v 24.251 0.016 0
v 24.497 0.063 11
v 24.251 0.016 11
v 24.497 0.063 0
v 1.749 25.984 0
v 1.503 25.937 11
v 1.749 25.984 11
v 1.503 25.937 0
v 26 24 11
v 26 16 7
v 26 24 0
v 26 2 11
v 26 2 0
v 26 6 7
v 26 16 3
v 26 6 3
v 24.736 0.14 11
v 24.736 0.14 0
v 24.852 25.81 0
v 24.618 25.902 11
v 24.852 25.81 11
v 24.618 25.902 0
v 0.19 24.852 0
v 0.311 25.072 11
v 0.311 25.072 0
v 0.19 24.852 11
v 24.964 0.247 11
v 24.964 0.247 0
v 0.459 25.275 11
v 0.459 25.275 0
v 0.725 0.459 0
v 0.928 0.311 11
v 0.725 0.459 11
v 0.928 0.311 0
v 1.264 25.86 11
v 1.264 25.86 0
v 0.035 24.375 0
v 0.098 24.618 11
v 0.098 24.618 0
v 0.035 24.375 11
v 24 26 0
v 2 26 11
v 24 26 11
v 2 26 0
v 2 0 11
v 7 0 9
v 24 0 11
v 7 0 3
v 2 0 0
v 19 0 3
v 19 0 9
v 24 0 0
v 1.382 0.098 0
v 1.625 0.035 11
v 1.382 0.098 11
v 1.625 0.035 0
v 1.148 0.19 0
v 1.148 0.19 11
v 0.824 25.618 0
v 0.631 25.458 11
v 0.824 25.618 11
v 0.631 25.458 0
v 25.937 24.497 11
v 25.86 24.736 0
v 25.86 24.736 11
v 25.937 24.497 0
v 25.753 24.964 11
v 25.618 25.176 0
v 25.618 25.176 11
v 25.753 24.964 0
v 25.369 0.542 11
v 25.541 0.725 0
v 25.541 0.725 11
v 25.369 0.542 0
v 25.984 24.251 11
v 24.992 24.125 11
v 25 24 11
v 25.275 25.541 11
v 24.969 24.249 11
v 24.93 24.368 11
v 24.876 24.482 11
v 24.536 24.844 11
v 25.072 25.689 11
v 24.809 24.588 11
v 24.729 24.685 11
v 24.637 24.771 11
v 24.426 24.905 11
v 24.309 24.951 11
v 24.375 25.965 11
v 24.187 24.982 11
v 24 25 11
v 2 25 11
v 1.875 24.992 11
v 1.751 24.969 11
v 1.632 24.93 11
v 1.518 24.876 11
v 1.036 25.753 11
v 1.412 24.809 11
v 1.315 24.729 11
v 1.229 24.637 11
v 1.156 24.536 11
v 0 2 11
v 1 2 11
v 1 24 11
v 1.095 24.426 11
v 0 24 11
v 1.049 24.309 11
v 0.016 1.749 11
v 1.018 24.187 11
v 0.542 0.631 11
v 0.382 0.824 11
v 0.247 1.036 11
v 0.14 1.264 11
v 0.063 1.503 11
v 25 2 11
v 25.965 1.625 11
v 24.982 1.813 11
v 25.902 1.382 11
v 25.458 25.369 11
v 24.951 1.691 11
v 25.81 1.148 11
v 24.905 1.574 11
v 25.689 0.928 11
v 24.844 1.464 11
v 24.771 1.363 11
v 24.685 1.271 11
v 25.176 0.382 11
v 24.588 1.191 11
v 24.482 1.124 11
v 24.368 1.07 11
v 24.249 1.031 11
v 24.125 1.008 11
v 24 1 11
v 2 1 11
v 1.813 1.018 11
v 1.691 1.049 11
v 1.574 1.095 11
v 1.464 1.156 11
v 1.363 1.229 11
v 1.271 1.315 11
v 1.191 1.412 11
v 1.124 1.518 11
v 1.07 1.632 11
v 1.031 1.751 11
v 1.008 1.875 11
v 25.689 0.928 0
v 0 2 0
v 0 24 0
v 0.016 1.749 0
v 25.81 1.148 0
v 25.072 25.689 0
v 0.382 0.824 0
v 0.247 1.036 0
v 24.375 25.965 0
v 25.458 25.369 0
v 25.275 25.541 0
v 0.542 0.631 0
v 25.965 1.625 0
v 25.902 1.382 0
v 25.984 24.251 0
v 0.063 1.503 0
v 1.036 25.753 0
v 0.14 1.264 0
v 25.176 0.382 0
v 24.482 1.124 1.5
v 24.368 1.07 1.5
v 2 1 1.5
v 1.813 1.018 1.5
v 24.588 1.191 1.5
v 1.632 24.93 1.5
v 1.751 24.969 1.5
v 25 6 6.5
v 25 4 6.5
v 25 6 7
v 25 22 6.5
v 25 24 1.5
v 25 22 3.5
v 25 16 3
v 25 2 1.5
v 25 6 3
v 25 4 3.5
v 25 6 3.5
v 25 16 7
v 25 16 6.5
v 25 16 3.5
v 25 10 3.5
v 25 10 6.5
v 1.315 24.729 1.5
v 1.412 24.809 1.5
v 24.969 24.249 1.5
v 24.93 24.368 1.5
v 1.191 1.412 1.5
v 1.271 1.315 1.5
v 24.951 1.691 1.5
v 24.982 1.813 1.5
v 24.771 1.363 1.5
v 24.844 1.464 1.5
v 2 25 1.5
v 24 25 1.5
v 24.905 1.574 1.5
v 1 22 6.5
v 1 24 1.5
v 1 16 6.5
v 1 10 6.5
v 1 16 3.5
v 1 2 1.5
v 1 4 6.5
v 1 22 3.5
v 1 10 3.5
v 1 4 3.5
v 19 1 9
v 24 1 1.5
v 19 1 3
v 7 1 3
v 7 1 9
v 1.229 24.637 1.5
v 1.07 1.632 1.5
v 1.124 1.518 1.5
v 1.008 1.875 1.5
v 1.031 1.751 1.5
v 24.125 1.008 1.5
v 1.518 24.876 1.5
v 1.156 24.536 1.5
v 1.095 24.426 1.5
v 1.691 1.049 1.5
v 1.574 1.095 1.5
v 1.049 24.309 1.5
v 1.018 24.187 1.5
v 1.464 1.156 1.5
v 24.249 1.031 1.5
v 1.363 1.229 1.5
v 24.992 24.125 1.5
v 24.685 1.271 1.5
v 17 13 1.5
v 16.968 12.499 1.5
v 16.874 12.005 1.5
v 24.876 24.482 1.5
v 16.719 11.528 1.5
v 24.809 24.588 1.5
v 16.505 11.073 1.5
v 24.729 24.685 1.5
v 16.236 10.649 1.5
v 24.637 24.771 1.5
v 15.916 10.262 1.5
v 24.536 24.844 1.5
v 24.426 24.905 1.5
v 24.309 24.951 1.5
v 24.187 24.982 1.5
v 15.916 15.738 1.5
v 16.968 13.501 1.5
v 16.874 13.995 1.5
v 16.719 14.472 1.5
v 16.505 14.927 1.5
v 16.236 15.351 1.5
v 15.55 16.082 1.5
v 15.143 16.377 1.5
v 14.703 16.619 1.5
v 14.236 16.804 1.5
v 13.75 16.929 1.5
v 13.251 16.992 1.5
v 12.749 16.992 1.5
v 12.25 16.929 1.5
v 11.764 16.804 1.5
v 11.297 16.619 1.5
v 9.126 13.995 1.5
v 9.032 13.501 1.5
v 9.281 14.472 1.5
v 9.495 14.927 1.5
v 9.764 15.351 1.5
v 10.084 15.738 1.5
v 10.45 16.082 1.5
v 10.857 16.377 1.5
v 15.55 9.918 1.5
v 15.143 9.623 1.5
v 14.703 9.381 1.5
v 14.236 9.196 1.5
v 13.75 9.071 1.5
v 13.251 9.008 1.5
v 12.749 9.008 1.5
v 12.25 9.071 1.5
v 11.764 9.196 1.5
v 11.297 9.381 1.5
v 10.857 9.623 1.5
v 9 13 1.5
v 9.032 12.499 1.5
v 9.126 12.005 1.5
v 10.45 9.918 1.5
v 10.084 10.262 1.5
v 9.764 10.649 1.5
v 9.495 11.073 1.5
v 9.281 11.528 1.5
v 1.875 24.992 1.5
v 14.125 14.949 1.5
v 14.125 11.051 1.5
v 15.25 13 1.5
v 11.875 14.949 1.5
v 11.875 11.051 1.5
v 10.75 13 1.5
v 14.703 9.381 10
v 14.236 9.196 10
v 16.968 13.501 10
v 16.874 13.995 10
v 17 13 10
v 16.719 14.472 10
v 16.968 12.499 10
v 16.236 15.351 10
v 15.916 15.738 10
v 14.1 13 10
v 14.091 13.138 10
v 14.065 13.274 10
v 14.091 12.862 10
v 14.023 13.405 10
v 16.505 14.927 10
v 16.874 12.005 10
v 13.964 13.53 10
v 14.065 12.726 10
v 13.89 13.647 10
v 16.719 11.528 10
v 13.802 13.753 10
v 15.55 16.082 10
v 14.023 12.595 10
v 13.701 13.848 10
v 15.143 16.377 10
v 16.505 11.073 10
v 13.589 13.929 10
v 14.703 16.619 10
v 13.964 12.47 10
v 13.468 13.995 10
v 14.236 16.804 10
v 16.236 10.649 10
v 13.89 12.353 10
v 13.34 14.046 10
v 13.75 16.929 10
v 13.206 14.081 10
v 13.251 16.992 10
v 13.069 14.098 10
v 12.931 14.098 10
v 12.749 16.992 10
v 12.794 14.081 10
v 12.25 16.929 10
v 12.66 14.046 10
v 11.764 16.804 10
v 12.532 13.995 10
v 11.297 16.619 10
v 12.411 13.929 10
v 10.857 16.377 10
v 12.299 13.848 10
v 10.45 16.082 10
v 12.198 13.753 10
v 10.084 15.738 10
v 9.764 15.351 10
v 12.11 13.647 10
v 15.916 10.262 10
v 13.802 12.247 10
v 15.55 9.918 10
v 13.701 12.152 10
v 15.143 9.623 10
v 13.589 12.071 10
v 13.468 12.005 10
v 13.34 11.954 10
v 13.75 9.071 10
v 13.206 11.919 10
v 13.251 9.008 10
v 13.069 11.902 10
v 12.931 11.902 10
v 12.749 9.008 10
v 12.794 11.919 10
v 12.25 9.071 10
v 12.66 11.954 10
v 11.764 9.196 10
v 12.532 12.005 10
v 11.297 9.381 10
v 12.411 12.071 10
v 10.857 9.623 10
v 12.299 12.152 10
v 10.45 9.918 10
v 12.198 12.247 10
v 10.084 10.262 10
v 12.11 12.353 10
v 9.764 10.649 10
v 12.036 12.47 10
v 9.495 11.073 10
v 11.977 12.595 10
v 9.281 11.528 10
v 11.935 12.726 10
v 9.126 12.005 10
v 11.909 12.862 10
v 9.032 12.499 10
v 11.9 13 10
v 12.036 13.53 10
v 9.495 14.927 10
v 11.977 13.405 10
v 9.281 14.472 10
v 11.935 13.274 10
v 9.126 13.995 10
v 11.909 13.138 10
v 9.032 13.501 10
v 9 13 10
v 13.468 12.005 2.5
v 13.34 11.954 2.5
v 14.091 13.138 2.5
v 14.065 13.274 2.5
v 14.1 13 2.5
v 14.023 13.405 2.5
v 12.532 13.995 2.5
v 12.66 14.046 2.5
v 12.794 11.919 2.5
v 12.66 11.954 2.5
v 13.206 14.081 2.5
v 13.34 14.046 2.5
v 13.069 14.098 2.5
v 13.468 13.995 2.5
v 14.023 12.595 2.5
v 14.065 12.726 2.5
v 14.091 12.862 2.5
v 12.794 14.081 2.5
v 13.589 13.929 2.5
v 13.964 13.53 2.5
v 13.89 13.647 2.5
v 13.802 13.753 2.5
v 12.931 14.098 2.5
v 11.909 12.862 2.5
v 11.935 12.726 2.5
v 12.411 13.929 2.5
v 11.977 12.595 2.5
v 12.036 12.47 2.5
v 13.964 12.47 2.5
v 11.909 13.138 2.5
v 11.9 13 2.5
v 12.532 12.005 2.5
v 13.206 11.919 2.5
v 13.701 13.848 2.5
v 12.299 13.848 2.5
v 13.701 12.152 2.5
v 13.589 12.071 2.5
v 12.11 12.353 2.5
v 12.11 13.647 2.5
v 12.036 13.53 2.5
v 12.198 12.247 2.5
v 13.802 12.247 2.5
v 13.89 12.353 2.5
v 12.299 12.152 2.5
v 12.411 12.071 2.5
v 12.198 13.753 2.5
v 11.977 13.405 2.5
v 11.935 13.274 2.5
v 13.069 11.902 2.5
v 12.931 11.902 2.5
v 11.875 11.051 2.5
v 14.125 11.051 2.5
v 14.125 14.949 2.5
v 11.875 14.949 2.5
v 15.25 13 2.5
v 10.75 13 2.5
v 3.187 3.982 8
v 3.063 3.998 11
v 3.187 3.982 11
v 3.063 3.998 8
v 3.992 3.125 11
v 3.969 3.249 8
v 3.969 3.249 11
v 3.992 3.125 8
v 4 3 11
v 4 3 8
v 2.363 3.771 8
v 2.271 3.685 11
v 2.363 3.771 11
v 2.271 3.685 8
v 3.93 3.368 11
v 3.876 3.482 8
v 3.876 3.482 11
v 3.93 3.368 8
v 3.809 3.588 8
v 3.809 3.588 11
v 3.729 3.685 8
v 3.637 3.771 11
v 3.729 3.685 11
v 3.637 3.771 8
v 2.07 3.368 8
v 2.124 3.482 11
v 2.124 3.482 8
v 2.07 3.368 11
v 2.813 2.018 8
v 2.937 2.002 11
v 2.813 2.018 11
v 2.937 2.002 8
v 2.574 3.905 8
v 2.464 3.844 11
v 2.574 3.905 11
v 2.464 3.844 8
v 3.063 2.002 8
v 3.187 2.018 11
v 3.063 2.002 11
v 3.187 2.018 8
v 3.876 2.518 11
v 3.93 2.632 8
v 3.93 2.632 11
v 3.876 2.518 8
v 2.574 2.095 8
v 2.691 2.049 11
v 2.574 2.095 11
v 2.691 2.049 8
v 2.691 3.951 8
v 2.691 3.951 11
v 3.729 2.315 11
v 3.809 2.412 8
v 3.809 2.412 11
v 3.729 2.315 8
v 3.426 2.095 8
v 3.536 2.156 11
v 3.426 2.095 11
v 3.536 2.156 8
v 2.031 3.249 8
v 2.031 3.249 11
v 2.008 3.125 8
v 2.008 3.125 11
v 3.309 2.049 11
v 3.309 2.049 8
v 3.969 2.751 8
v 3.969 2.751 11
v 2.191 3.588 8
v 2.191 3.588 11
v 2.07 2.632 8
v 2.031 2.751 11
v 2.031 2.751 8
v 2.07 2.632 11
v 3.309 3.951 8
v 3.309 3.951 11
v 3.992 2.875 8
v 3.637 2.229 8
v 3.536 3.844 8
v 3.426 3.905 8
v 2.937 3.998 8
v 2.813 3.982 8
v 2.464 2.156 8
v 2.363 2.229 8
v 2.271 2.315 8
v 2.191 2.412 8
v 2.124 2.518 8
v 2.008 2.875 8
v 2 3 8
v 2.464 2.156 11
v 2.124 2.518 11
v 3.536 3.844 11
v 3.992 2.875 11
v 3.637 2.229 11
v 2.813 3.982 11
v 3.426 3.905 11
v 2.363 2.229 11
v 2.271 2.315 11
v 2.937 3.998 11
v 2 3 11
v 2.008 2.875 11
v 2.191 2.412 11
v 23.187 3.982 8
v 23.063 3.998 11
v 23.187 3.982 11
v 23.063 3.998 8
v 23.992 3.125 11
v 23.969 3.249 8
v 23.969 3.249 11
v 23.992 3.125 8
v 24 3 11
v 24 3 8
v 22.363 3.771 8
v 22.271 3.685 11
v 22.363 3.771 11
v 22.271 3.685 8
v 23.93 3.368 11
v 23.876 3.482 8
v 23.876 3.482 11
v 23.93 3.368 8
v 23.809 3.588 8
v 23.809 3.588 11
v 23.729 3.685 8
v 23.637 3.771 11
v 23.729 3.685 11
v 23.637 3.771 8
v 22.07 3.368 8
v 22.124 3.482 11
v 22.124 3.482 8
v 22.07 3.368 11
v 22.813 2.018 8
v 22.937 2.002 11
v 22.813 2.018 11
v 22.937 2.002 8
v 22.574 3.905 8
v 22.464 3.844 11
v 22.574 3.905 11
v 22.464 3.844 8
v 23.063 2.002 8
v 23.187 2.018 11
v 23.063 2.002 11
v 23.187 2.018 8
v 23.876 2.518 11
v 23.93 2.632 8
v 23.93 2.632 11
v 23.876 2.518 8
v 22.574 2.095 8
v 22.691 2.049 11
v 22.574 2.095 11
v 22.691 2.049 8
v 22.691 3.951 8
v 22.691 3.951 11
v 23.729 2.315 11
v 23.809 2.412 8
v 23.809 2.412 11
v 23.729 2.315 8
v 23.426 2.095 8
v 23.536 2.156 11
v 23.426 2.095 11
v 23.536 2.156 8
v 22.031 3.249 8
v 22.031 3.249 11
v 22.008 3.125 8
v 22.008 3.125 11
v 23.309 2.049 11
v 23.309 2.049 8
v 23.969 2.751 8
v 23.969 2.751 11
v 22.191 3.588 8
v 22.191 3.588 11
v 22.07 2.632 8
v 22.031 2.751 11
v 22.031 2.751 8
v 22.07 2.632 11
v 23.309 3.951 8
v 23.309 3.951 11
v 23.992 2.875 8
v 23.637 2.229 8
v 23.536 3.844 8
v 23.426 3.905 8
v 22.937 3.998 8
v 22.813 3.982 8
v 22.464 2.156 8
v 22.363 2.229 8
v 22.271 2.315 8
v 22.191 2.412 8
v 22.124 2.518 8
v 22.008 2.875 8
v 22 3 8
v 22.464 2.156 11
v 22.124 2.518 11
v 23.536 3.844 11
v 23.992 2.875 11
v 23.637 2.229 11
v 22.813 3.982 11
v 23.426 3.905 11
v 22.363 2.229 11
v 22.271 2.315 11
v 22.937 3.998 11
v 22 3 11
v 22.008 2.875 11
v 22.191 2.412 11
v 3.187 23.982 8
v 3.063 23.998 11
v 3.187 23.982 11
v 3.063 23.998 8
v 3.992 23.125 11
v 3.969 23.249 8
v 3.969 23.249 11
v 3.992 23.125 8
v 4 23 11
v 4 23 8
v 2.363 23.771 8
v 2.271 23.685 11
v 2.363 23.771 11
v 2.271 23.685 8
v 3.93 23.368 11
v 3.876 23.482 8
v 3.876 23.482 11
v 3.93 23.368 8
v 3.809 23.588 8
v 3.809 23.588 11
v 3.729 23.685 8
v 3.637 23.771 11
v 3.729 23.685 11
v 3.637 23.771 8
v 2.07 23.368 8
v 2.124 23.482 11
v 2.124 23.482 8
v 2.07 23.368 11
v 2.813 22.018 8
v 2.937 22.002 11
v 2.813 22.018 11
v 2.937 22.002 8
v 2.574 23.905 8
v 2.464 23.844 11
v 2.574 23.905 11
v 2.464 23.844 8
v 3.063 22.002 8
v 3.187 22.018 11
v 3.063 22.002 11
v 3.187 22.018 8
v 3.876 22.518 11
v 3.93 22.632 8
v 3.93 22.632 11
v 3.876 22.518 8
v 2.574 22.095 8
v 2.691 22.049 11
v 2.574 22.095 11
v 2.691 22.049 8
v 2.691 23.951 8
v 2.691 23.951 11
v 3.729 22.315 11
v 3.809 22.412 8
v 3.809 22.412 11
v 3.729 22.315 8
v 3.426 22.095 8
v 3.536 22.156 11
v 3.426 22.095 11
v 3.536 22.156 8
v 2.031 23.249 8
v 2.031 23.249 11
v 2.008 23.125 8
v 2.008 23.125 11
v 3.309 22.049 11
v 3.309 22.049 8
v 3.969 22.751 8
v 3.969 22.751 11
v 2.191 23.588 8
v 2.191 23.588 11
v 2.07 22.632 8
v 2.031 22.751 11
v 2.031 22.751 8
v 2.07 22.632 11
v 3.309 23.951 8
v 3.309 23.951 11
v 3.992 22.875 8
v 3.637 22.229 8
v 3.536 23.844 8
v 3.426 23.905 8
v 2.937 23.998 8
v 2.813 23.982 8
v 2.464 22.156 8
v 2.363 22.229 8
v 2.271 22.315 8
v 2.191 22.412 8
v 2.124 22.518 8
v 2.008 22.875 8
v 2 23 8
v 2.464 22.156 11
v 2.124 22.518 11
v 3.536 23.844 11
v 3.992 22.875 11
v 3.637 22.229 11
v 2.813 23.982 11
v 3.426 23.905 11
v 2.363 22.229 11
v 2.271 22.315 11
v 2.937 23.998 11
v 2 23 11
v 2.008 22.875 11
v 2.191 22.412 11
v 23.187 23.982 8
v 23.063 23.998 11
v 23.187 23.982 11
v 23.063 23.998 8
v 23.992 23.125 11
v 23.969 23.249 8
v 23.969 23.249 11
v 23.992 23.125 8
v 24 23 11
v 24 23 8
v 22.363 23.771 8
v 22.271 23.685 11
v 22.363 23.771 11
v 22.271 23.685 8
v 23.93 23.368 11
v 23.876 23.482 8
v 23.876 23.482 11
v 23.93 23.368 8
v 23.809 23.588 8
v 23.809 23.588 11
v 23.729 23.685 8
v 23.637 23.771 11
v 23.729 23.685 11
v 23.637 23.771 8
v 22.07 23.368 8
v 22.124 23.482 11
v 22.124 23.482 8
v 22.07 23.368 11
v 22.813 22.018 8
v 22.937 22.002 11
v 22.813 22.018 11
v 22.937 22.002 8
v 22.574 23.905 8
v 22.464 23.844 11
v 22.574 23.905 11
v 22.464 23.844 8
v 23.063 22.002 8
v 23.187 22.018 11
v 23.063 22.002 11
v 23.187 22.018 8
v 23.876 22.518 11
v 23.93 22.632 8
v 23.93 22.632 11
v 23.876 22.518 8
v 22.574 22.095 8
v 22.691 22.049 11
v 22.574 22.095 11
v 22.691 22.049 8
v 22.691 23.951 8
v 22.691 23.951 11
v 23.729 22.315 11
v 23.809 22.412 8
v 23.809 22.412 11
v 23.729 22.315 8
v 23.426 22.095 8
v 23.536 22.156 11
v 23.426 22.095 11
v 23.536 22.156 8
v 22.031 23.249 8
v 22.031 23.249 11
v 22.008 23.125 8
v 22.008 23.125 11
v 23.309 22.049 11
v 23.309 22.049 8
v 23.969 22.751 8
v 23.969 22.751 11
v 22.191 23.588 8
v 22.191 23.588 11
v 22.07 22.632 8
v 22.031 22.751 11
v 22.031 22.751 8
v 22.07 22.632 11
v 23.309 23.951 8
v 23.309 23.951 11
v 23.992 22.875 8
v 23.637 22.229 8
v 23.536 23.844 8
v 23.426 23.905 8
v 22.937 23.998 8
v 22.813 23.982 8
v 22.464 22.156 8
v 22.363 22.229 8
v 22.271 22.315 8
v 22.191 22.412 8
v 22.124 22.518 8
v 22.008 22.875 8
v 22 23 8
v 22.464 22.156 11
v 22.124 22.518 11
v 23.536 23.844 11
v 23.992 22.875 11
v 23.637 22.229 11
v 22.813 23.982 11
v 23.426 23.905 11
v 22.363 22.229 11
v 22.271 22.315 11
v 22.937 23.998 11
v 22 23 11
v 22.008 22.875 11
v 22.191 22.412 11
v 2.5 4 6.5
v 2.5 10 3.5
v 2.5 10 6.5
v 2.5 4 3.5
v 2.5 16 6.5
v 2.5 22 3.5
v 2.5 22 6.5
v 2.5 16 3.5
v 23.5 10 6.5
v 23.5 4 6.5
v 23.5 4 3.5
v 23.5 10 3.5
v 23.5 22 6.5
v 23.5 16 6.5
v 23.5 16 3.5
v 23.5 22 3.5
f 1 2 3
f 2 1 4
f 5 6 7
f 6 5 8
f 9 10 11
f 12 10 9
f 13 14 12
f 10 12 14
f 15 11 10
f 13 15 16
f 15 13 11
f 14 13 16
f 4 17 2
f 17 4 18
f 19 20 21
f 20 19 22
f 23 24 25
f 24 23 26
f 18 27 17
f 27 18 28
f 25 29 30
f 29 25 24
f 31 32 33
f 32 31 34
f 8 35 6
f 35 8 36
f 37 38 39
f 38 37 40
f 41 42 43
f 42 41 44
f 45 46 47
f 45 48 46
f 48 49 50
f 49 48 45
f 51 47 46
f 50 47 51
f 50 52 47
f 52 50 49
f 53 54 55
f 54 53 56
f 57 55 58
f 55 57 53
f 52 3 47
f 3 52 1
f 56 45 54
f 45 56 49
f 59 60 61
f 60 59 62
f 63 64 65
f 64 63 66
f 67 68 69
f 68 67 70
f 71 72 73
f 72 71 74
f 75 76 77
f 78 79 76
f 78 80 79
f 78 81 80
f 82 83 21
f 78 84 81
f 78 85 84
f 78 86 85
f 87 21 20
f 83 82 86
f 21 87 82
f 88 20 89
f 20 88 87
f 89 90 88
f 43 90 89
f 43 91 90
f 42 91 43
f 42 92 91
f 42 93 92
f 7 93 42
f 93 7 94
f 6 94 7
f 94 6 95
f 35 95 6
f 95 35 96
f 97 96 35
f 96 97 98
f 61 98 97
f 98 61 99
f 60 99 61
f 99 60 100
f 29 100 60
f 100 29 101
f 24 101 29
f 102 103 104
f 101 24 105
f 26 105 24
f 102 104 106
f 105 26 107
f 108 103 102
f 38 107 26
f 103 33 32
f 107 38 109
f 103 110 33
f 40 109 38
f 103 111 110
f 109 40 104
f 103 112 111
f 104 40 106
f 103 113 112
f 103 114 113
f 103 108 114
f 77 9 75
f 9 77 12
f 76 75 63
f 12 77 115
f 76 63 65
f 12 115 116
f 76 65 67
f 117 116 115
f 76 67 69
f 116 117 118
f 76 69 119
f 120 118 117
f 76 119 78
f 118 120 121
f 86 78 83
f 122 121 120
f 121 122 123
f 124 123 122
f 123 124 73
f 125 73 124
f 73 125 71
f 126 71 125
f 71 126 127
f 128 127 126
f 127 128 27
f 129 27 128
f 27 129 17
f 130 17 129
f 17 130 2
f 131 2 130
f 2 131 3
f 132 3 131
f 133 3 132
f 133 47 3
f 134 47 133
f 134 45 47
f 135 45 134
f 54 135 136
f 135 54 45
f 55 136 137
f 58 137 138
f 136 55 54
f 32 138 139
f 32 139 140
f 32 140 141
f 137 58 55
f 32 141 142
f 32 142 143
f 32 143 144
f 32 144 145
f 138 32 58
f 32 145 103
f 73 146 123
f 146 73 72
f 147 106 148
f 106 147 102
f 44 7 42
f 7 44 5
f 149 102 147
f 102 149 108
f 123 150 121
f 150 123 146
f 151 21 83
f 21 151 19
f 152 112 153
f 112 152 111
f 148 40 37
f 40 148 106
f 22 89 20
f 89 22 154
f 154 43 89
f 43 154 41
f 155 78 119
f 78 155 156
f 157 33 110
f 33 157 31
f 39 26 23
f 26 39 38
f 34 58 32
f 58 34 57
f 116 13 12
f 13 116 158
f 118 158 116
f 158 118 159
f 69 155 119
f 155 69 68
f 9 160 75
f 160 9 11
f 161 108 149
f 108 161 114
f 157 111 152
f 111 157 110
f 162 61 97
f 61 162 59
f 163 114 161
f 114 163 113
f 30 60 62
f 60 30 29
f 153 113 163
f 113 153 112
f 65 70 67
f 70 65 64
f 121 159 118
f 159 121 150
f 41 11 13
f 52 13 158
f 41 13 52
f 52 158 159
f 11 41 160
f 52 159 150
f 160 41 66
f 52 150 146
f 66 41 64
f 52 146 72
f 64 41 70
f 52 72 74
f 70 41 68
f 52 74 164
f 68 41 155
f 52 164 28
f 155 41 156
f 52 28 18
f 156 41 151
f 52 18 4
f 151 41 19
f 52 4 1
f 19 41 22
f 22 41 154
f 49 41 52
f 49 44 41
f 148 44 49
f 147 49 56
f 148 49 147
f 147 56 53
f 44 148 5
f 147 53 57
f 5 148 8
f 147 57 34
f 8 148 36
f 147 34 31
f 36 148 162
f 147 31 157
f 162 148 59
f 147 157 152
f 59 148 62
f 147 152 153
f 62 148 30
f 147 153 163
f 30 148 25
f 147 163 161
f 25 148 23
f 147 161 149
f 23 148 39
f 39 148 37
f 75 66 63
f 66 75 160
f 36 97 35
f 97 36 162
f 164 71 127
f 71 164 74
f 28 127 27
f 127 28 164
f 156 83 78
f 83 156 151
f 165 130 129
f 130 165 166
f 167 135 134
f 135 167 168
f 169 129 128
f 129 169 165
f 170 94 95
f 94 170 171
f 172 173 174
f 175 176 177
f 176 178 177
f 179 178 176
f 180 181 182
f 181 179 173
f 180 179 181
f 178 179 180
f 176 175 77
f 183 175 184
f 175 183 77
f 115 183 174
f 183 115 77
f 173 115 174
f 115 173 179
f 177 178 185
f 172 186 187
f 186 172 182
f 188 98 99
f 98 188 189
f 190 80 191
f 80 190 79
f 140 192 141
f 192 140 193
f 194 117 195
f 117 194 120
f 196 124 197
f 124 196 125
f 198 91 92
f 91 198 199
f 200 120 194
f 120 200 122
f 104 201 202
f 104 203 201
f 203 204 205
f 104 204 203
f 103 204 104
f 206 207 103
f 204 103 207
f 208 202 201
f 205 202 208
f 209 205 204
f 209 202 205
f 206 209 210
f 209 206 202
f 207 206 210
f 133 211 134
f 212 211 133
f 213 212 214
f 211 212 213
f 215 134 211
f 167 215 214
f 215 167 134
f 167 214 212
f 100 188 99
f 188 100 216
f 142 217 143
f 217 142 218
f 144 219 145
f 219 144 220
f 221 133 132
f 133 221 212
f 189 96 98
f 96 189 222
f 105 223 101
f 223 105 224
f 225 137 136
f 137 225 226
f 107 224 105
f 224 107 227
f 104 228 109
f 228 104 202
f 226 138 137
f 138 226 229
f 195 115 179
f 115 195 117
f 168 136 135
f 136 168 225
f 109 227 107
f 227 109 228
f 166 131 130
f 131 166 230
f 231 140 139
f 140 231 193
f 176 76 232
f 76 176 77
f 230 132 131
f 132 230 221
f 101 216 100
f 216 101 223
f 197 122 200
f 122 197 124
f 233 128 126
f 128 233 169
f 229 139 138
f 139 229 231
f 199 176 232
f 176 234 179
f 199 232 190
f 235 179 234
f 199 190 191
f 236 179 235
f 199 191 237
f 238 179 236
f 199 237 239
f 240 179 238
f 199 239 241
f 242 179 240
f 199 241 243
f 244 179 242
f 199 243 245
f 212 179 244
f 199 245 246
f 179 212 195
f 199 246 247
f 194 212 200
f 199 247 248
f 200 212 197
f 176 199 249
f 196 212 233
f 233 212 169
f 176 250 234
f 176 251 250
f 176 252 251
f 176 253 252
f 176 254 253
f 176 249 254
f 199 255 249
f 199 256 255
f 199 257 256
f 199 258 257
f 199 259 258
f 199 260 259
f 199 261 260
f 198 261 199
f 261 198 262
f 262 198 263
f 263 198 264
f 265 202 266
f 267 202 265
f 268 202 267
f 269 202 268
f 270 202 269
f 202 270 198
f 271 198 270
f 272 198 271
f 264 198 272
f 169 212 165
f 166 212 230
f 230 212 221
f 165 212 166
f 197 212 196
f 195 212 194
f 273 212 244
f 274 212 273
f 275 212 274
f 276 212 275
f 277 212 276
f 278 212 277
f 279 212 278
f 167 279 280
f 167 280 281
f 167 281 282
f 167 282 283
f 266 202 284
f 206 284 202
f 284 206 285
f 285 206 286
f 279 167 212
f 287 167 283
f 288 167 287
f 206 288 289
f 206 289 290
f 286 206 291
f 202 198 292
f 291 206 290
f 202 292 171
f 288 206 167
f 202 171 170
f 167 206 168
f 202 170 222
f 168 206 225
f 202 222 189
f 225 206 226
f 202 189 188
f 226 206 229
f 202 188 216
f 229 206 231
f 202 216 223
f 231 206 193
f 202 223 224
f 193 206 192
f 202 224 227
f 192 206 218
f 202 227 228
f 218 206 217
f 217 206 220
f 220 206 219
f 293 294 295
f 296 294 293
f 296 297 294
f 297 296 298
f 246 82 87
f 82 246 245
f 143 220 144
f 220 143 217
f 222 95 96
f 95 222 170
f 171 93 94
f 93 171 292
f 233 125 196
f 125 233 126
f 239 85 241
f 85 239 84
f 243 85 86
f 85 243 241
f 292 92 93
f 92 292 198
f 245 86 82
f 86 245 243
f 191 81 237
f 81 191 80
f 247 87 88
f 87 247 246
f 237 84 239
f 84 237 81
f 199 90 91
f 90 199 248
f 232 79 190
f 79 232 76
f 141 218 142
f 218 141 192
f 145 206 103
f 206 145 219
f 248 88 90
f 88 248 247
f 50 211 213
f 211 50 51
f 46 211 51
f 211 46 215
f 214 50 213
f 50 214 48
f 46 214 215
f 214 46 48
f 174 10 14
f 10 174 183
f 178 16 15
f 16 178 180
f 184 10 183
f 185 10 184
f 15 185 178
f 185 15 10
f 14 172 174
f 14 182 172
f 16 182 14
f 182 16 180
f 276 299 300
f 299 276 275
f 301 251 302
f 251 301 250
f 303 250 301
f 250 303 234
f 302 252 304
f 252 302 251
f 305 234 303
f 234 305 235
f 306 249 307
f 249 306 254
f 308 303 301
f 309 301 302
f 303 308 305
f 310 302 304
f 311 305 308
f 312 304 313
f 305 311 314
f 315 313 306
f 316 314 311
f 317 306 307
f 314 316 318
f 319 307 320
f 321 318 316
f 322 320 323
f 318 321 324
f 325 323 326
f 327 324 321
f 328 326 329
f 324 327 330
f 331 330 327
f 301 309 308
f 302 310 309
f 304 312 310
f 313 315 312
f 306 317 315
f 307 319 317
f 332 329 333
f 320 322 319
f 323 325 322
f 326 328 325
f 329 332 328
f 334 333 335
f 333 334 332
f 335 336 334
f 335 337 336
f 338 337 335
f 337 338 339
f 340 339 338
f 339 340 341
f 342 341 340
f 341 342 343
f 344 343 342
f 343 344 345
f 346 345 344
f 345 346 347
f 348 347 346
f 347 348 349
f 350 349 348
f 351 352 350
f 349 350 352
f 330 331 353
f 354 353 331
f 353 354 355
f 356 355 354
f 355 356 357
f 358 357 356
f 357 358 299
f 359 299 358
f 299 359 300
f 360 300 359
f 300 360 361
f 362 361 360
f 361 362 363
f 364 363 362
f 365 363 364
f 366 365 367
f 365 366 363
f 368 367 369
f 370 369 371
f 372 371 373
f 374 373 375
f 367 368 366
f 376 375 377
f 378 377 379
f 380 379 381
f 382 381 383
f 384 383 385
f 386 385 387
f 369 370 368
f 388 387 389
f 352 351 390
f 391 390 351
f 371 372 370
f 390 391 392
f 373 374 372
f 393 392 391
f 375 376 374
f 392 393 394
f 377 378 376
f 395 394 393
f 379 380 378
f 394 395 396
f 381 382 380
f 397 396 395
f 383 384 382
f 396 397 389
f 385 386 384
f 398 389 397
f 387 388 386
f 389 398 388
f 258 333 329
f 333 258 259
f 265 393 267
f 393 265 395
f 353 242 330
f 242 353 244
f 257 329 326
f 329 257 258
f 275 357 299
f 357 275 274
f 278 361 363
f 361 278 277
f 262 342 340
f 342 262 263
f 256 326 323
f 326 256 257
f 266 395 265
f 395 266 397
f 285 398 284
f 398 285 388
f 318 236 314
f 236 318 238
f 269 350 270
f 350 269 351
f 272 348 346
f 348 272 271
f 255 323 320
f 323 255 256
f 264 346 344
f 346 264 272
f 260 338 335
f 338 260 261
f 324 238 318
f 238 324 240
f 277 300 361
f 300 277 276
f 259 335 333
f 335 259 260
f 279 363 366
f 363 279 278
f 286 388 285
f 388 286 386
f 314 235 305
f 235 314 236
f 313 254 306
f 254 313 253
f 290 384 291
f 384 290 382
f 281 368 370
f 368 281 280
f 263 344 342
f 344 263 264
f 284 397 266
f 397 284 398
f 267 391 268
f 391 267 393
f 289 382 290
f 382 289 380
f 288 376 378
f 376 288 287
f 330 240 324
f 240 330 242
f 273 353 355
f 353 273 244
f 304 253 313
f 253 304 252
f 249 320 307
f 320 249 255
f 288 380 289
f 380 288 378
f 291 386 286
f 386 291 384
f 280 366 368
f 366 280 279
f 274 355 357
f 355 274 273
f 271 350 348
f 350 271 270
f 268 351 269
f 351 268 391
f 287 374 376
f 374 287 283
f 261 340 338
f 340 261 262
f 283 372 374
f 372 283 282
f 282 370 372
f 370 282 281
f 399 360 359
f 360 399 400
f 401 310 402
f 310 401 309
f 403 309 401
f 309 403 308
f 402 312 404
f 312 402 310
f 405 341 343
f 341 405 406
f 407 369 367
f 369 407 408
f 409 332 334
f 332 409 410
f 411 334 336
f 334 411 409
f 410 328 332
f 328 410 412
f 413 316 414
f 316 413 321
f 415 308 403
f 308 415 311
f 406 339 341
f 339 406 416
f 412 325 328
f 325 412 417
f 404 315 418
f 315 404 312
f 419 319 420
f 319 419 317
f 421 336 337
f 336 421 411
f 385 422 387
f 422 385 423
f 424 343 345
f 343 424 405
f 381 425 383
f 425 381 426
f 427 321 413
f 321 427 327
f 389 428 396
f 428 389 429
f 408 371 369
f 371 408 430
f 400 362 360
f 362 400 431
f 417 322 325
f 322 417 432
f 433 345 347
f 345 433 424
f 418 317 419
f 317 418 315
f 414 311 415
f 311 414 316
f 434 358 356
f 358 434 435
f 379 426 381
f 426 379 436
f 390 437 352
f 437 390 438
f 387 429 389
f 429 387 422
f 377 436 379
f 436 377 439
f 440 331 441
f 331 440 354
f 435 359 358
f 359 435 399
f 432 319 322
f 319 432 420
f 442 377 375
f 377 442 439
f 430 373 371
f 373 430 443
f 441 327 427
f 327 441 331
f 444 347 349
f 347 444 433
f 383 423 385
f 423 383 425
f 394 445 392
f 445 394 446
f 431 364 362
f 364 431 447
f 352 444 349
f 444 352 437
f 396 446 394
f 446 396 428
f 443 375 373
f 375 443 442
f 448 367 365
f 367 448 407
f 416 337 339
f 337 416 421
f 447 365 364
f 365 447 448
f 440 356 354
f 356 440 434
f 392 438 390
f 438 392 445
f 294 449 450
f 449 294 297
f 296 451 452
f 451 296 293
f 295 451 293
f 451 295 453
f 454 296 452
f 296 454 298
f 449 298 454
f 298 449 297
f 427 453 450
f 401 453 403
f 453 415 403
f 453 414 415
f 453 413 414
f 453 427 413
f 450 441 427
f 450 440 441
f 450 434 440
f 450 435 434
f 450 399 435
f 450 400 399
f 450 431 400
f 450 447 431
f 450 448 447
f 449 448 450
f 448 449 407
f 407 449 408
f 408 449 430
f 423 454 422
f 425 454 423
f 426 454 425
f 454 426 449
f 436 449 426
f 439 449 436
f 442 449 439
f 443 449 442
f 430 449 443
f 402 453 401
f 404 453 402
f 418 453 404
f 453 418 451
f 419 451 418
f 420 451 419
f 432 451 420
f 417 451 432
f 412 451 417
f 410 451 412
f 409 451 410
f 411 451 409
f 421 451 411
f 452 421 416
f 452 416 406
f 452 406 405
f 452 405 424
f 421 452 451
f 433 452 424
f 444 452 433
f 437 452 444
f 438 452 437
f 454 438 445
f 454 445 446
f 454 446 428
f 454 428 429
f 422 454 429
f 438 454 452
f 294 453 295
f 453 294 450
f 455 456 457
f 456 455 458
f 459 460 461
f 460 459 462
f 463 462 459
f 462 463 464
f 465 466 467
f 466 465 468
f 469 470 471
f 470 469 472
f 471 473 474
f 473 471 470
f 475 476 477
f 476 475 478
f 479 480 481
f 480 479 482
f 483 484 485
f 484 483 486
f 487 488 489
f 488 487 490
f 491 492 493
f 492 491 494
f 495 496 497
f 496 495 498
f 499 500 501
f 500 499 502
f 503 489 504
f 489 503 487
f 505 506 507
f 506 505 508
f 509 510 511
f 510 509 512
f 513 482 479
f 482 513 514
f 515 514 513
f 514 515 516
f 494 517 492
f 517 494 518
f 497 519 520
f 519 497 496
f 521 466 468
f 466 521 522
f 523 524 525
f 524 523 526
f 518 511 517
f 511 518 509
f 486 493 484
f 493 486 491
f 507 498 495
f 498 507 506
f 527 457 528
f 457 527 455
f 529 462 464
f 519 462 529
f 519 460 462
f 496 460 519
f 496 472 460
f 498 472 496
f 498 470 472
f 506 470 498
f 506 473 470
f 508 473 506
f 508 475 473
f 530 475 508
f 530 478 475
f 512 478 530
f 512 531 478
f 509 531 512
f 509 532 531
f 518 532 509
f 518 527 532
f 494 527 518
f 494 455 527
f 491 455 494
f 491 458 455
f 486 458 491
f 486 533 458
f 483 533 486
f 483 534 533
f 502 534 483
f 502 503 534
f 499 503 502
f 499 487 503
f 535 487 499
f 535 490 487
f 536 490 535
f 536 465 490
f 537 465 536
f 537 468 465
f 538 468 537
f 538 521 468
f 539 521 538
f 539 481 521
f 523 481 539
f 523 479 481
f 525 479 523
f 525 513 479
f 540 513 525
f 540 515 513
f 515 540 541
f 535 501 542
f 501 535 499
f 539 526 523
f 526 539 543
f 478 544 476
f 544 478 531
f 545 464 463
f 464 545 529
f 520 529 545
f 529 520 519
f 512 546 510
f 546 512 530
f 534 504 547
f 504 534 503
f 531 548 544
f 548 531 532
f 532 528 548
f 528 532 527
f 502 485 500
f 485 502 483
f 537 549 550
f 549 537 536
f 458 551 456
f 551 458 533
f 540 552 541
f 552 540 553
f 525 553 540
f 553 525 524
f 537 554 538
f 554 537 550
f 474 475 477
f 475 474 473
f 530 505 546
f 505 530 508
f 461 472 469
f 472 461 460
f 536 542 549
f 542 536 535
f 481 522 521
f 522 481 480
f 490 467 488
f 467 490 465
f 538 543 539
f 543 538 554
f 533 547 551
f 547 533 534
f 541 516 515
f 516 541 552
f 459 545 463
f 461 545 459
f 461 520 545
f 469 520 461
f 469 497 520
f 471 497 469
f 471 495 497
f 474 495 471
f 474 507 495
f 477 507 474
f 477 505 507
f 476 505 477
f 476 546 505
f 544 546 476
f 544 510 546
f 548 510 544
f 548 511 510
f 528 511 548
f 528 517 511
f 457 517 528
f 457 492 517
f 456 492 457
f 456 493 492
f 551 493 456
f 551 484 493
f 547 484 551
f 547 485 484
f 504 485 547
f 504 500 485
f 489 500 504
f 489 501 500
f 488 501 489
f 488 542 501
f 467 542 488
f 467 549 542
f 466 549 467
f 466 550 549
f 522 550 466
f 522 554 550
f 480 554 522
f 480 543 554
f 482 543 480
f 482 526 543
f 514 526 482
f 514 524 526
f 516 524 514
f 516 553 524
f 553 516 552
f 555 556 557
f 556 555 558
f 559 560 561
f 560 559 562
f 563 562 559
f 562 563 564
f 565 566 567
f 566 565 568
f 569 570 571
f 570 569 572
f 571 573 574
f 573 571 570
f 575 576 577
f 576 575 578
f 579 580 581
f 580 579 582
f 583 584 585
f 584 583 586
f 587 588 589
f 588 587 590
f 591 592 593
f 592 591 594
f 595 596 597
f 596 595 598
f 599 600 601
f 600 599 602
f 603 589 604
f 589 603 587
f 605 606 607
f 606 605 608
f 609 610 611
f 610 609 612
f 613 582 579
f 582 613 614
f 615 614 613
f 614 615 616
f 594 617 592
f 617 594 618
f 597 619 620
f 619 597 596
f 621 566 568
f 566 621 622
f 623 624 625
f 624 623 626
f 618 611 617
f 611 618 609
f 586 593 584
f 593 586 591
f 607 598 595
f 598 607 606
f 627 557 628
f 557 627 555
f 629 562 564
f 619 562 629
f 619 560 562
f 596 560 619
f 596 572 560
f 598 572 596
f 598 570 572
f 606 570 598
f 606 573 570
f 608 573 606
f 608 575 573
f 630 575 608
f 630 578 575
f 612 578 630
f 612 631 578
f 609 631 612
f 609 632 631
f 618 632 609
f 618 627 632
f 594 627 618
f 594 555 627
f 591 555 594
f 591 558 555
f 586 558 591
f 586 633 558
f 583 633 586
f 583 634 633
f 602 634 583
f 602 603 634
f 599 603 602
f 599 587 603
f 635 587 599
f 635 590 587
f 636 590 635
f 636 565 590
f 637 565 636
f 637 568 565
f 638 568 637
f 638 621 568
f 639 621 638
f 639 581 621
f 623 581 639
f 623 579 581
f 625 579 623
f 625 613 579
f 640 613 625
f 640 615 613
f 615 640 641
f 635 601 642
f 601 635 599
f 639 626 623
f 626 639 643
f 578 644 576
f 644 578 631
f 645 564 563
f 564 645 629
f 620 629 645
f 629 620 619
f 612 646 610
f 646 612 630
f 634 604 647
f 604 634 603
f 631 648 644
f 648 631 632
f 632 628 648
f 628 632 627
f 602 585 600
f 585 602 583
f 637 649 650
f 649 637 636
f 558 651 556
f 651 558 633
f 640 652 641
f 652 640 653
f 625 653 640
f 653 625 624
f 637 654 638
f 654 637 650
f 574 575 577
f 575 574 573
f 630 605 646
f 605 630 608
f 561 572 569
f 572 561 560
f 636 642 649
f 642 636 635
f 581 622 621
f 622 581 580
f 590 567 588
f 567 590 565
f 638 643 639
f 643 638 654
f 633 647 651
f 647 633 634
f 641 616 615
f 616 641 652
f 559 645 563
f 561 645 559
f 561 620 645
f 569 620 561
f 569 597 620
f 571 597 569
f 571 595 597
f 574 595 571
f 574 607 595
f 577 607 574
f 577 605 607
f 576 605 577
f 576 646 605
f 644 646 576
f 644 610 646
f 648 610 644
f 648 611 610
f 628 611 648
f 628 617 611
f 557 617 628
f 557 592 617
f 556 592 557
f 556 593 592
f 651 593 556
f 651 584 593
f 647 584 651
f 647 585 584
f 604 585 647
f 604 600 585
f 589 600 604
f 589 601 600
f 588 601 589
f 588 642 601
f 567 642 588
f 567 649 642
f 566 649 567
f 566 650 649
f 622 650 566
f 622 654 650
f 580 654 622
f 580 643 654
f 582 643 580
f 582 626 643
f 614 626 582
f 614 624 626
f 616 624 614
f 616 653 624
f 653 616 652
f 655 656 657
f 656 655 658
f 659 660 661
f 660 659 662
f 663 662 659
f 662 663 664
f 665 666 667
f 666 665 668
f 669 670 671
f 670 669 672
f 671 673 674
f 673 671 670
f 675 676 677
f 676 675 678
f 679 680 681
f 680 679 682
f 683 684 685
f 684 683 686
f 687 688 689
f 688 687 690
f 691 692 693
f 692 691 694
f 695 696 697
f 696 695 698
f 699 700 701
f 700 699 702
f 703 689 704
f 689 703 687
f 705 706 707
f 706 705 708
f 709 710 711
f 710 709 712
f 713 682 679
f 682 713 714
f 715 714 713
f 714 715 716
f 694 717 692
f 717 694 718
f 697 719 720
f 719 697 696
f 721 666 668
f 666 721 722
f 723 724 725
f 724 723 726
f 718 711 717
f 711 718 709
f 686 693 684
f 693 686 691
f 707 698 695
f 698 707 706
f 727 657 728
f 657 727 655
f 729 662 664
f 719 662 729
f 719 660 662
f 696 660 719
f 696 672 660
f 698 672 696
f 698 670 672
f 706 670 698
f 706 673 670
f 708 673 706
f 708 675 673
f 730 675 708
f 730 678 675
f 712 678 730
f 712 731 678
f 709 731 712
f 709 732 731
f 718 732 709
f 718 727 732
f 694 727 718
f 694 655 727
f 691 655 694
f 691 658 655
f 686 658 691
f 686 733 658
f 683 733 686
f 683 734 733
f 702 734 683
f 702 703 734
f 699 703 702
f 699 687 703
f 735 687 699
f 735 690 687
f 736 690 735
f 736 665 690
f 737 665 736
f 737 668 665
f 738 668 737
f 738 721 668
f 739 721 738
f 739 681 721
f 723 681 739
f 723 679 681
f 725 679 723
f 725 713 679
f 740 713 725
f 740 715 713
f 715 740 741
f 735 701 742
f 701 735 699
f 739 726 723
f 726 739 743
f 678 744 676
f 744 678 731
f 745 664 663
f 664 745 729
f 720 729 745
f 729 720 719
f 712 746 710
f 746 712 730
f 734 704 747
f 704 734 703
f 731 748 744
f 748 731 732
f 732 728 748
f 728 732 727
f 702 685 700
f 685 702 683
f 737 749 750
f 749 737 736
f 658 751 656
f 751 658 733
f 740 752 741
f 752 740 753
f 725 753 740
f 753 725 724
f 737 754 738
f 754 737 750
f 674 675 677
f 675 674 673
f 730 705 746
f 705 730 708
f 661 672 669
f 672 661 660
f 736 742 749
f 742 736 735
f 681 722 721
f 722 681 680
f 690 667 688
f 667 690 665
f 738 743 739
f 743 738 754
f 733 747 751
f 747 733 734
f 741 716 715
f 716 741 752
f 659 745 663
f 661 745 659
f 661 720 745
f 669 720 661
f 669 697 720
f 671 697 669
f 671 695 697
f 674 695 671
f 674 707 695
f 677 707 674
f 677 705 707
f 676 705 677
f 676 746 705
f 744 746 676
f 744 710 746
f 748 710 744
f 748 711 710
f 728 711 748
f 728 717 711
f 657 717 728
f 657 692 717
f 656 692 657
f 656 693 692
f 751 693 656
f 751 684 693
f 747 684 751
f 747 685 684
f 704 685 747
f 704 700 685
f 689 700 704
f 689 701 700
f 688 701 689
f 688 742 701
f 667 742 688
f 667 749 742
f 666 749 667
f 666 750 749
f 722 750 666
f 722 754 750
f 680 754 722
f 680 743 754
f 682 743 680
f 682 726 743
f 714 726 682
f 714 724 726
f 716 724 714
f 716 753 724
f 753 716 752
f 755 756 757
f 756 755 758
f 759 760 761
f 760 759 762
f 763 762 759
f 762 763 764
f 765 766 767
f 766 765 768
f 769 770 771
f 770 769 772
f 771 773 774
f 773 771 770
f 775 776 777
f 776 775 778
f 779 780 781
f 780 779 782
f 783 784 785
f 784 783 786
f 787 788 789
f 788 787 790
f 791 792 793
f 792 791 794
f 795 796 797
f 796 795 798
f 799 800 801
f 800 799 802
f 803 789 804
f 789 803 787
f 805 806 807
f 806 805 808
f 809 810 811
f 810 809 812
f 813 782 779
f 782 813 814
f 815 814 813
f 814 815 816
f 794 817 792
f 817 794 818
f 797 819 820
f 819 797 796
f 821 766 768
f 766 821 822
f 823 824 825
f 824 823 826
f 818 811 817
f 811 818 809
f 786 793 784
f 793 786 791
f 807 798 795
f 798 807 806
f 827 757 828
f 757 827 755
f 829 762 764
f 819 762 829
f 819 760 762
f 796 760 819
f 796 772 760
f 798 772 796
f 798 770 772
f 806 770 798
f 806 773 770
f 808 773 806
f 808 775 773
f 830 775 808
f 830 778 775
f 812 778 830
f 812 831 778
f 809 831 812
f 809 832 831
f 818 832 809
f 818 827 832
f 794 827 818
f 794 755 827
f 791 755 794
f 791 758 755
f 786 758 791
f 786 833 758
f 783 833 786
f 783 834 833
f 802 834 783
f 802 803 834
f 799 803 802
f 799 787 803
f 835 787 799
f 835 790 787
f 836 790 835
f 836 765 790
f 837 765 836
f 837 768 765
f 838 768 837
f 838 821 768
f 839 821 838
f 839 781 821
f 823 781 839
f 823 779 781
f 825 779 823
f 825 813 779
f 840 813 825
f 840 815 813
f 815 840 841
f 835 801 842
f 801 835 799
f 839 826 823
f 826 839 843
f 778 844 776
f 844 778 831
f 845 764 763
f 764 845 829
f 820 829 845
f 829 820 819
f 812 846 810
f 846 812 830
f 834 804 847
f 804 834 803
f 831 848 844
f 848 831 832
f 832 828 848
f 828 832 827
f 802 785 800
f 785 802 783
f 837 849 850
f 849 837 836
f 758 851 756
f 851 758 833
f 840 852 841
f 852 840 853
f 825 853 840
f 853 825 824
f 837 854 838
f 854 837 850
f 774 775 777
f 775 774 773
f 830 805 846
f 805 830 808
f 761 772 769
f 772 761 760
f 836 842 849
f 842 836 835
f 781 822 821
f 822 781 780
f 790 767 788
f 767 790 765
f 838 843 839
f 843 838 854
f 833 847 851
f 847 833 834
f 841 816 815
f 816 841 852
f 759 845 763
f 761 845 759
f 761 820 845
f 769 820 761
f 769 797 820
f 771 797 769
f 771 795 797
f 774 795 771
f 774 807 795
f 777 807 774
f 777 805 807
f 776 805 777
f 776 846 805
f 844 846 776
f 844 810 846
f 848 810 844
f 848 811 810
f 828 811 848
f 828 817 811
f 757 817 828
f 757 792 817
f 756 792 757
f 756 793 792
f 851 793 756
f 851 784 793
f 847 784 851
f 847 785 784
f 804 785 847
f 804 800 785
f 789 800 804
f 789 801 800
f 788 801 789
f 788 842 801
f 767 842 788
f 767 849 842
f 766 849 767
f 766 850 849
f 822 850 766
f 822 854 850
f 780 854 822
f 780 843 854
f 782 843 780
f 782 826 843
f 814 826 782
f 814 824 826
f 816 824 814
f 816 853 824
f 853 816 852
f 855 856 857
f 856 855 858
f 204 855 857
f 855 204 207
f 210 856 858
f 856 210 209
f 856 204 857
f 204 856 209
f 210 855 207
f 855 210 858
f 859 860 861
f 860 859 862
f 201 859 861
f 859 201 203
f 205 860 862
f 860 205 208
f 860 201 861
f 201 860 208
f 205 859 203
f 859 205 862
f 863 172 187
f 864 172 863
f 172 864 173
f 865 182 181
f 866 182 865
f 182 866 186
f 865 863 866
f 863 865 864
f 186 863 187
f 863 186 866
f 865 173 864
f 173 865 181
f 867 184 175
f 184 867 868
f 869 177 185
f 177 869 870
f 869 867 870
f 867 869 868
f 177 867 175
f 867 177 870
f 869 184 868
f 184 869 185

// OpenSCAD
// ESP32 Pomodoro Button - Simple Backpack Enclosure
// Atom Lite on top, expansion board on bottom, connected by M2 screw + GROVE

// === Parameters ===
$fn = 50;

// Atom Lite dimensions
atom_size = 24;
atom_height = 9.5;

// PCB dimensions (same as Atom Lite)
pcb_size = 24;
pcb_thickness = 1.6;

// Component height on PCB
component_height = 4;  // TP4056, USB-C, etc.

// M2 mounting
m2_hole = 2.2;
m2_head_dia = 4;
m2_nut_dia = 4.5;
m2_screw_length = 10;  // M2x10mm

// GROVE connector grove_height = 4;
// Battery dimensions
battery_width = 30;
battery_length = 40;
battery_height = 5;

// === Simple Backpack Case ===
// Just the bottom part that holds the extension board and battery
module backpack() {
    // Base plate with walls
    base_thickness = 1.5;
    wall_height = component_height + battery_height + 2;
    
    union() {
        // Main shell with cutouts
        difference() {
            // Outer shell
            linear_extrude(height = wall_height)
                rounded_square(pcb_size + 2, pcb_size + 2, 2);
            
            // Hollow interior
            translate([1, 1, base_thickness])
                linear_extrude(height = wall_height)
                    rounded_square(pcb_size, pcb_size, 1);
            
            // USB-C opening (side)
            translate([(pcb_size + 2 - 12)/2, -0.5, wall_height - 8])
                cube([12, 2, 6]);
            
            // Switch opening (side)
            translate([pcb_size + 2 - 1.5, 6, wall_height - 8])
                cube([2, 10, 4]);
        }
        
        // PCB mounting posts (4 corners, match Atom Lite hole pattern)
        // Actually Atom Lite only has ONE center M2 hole
        // So we use the center hole for mounting
        
        // Center M2 post (main mounting point)
        post_height = wall_height - 1;
        difference() {
            translate([(pcb_size + 2)/2, (pcb_size + 2)/2, 0])
                cylinder(d=8, h=post_height);
            translate([(pcb_size + 2)/2, (pcb_size + 2)/2, -0.5])
                cylinder(d=m2_hole, h=post_height + 1);
            // Nut trap at bottom
            translate([(pcb_size + 2)/2, (pcb_size + 2)/2, -0.5])
                cylinder(d=m2_nut_dia, h=3, $fn=6);
        }
        
        // Small alignment pins (optional, for stability)
        pin_positions = [
            [3, 3],
            [pcb_size + 2 - 3, 3],
            [3, pcb_size + 2 - 3],
            [pcb_size + 2 - 3, pcb_size + 2 - 3]
        ];
        
        for (pos = pin_positions) {
            translate([pos[0], pos[1], wall_height - 3])
                cylinder(d=2, h=3);
        }
        
        // Battery retention clips
        translate([1, 4, base_thickness + 2])
            cube([1.5, 6, battery_height - 2]);
        translate([1, pcb_size + 2 - 10, base_thickness + 2])
            cube([1.5, 6, battery_height - 2]);
        translate([pcb_size + 2 - 2.5, 4, base_thickness + 2])
            cube([1.5, 6, battery_height - 2]);
        translate([pcb_size + 2 - 2.5, pcb_size + 2 - 10, base_thickness + 2])
            cube([1.5, 6, battery_height - 2]);
    }
}

// === Helper: Rounded Square ===
module rounded_square(w, h, r) {
    if (r > 0) {
        offset(r = r) offset(r = -r)
            square([w, h]);
    } else {
        square([w, h]);
    }
}

// === Assembly Preview ===
module assembly() {
    // Backpack (bottom)
    color("gray", 0.7)
        backpack();
    
    // Extension PCB (visual)
    translate([1, 1, 6])
        color("green", 0.8)
        cube([24, 24, 1.6]);
    
    // Battery (visual)
    translate([3, 3, 1.5])
        color("blue", 0.5)
        cube([30, 40, 5]);
    
    // M2 screw (visual)
    translate([(pcb_size + 2)/2, (pcb_size + 2)/2, 0])
        color("silver")
        cylinder(d=2, h=20);
    
    // Atom Lite (visual, on top)
    translate([1, 1, 15])
        color("darkgray")
        cube([24, 24, 9.5]);
    
    // GROVE cable (visual)
    color("black", 0.5) {
        translate([12, 25, 8])
            cube([6, 4, 2]);
        translate([12, 25, 16])
            cube([6, 4, 2]);
    }
}

// === Export ===
// Export the backpack:
backpack();

// Or preview assembly:
// assembly();
